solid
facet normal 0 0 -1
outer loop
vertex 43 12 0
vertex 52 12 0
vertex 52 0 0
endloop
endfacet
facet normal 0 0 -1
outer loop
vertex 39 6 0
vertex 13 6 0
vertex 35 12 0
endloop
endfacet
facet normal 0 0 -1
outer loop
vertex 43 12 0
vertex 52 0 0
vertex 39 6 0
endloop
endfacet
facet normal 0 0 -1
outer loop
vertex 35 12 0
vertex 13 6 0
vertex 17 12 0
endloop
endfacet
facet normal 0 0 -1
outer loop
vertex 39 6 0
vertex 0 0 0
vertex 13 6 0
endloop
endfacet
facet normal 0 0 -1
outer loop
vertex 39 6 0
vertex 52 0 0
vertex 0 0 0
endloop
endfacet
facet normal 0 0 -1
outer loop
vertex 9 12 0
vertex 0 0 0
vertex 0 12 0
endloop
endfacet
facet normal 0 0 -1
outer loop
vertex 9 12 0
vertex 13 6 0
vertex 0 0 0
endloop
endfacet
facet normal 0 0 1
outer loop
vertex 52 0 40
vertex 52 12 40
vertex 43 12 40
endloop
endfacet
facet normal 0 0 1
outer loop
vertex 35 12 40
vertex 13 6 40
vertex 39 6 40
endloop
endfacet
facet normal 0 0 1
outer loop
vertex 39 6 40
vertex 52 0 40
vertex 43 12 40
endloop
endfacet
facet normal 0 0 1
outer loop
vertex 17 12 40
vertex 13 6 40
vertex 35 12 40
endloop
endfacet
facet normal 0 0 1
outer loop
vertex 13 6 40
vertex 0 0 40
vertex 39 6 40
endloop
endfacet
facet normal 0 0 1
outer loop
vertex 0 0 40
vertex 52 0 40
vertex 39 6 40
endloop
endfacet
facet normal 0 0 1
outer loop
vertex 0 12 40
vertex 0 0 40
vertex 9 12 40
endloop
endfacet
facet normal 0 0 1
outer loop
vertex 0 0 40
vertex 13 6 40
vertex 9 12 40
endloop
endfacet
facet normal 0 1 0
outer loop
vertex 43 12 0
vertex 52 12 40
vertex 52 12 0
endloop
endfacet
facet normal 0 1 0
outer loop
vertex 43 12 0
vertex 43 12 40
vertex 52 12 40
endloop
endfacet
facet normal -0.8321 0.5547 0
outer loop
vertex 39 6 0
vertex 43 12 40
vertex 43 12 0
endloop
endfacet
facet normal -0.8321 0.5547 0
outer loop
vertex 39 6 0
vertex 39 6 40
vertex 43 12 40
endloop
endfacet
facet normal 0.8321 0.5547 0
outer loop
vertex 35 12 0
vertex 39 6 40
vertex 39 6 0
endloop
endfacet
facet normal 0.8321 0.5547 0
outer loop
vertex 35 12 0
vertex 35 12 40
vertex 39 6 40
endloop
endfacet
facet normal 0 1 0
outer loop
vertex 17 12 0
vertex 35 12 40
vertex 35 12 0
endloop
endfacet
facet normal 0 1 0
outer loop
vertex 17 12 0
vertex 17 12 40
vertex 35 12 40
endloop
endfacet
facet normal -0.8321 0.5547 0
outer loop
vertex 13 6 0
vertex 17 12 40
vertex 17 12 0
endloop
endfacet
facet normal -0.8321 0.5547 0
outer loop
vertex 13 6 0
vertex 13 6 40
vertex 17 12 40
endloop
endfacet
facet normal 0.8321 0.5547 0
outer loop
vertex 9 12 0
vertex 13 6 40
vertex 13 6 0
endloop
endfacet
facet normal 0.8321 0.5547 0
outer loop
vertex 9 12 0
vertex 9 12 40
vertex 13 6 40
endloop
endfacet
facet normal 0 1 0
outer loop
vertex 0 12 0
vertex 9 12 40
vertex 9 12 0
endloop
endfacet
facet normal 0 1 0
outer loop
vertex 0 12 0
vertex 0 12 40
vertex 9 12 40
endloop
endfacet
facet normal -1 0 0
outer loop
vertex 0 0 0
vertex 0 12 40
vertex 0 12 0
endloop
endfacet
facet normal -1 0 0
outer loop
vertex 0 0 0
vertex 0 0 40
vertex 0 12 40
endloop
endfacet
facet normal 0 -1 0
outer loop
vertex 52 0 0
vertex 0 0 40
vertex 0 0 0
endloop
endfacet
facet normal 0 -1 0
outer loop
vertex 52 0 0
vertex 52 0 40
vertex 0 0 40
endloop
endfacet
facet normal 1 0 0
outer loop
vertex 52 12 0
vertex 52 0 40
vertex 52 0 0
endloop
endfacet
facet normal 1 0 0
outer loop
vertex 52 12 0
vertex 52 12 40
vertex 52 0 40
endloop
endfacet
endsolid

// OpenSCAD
$fn = 32;

// ----------------------------------------------------------------------
// V guide rail: doublev, 52 mm wide
// ----------------------------------------------------------------------

// --- parameters (mm) ---
rail_w = 52;              // rail width, X
base_t = 12;              // base plate thickness
v_depth = 6;              // V feature depth / height
v_half_w = 8;             // half width of the V at the base face
plate_t = 40;             // rail length, Z (the extrusion height)
groove_off = 13;          // offset of each groove from the centreline

centre_x = rail_w / 2;  // rail centreline
groove_a = centre_x - groove_off;  // axis of the first groove
groove_b = centre_x + groove_off;  // axis of the second groove

profile = [[0, 0], [52, 0], [52, 12], [43, 12], [39, 6], [35, 12], [17, 12], [13, 6], [9, 12], [0, 12]];  // primary outline, 10 points, counter clockwise

// --- the one profile operation ---
linear_extrude(height = plate_t) polygon(points = profile);
